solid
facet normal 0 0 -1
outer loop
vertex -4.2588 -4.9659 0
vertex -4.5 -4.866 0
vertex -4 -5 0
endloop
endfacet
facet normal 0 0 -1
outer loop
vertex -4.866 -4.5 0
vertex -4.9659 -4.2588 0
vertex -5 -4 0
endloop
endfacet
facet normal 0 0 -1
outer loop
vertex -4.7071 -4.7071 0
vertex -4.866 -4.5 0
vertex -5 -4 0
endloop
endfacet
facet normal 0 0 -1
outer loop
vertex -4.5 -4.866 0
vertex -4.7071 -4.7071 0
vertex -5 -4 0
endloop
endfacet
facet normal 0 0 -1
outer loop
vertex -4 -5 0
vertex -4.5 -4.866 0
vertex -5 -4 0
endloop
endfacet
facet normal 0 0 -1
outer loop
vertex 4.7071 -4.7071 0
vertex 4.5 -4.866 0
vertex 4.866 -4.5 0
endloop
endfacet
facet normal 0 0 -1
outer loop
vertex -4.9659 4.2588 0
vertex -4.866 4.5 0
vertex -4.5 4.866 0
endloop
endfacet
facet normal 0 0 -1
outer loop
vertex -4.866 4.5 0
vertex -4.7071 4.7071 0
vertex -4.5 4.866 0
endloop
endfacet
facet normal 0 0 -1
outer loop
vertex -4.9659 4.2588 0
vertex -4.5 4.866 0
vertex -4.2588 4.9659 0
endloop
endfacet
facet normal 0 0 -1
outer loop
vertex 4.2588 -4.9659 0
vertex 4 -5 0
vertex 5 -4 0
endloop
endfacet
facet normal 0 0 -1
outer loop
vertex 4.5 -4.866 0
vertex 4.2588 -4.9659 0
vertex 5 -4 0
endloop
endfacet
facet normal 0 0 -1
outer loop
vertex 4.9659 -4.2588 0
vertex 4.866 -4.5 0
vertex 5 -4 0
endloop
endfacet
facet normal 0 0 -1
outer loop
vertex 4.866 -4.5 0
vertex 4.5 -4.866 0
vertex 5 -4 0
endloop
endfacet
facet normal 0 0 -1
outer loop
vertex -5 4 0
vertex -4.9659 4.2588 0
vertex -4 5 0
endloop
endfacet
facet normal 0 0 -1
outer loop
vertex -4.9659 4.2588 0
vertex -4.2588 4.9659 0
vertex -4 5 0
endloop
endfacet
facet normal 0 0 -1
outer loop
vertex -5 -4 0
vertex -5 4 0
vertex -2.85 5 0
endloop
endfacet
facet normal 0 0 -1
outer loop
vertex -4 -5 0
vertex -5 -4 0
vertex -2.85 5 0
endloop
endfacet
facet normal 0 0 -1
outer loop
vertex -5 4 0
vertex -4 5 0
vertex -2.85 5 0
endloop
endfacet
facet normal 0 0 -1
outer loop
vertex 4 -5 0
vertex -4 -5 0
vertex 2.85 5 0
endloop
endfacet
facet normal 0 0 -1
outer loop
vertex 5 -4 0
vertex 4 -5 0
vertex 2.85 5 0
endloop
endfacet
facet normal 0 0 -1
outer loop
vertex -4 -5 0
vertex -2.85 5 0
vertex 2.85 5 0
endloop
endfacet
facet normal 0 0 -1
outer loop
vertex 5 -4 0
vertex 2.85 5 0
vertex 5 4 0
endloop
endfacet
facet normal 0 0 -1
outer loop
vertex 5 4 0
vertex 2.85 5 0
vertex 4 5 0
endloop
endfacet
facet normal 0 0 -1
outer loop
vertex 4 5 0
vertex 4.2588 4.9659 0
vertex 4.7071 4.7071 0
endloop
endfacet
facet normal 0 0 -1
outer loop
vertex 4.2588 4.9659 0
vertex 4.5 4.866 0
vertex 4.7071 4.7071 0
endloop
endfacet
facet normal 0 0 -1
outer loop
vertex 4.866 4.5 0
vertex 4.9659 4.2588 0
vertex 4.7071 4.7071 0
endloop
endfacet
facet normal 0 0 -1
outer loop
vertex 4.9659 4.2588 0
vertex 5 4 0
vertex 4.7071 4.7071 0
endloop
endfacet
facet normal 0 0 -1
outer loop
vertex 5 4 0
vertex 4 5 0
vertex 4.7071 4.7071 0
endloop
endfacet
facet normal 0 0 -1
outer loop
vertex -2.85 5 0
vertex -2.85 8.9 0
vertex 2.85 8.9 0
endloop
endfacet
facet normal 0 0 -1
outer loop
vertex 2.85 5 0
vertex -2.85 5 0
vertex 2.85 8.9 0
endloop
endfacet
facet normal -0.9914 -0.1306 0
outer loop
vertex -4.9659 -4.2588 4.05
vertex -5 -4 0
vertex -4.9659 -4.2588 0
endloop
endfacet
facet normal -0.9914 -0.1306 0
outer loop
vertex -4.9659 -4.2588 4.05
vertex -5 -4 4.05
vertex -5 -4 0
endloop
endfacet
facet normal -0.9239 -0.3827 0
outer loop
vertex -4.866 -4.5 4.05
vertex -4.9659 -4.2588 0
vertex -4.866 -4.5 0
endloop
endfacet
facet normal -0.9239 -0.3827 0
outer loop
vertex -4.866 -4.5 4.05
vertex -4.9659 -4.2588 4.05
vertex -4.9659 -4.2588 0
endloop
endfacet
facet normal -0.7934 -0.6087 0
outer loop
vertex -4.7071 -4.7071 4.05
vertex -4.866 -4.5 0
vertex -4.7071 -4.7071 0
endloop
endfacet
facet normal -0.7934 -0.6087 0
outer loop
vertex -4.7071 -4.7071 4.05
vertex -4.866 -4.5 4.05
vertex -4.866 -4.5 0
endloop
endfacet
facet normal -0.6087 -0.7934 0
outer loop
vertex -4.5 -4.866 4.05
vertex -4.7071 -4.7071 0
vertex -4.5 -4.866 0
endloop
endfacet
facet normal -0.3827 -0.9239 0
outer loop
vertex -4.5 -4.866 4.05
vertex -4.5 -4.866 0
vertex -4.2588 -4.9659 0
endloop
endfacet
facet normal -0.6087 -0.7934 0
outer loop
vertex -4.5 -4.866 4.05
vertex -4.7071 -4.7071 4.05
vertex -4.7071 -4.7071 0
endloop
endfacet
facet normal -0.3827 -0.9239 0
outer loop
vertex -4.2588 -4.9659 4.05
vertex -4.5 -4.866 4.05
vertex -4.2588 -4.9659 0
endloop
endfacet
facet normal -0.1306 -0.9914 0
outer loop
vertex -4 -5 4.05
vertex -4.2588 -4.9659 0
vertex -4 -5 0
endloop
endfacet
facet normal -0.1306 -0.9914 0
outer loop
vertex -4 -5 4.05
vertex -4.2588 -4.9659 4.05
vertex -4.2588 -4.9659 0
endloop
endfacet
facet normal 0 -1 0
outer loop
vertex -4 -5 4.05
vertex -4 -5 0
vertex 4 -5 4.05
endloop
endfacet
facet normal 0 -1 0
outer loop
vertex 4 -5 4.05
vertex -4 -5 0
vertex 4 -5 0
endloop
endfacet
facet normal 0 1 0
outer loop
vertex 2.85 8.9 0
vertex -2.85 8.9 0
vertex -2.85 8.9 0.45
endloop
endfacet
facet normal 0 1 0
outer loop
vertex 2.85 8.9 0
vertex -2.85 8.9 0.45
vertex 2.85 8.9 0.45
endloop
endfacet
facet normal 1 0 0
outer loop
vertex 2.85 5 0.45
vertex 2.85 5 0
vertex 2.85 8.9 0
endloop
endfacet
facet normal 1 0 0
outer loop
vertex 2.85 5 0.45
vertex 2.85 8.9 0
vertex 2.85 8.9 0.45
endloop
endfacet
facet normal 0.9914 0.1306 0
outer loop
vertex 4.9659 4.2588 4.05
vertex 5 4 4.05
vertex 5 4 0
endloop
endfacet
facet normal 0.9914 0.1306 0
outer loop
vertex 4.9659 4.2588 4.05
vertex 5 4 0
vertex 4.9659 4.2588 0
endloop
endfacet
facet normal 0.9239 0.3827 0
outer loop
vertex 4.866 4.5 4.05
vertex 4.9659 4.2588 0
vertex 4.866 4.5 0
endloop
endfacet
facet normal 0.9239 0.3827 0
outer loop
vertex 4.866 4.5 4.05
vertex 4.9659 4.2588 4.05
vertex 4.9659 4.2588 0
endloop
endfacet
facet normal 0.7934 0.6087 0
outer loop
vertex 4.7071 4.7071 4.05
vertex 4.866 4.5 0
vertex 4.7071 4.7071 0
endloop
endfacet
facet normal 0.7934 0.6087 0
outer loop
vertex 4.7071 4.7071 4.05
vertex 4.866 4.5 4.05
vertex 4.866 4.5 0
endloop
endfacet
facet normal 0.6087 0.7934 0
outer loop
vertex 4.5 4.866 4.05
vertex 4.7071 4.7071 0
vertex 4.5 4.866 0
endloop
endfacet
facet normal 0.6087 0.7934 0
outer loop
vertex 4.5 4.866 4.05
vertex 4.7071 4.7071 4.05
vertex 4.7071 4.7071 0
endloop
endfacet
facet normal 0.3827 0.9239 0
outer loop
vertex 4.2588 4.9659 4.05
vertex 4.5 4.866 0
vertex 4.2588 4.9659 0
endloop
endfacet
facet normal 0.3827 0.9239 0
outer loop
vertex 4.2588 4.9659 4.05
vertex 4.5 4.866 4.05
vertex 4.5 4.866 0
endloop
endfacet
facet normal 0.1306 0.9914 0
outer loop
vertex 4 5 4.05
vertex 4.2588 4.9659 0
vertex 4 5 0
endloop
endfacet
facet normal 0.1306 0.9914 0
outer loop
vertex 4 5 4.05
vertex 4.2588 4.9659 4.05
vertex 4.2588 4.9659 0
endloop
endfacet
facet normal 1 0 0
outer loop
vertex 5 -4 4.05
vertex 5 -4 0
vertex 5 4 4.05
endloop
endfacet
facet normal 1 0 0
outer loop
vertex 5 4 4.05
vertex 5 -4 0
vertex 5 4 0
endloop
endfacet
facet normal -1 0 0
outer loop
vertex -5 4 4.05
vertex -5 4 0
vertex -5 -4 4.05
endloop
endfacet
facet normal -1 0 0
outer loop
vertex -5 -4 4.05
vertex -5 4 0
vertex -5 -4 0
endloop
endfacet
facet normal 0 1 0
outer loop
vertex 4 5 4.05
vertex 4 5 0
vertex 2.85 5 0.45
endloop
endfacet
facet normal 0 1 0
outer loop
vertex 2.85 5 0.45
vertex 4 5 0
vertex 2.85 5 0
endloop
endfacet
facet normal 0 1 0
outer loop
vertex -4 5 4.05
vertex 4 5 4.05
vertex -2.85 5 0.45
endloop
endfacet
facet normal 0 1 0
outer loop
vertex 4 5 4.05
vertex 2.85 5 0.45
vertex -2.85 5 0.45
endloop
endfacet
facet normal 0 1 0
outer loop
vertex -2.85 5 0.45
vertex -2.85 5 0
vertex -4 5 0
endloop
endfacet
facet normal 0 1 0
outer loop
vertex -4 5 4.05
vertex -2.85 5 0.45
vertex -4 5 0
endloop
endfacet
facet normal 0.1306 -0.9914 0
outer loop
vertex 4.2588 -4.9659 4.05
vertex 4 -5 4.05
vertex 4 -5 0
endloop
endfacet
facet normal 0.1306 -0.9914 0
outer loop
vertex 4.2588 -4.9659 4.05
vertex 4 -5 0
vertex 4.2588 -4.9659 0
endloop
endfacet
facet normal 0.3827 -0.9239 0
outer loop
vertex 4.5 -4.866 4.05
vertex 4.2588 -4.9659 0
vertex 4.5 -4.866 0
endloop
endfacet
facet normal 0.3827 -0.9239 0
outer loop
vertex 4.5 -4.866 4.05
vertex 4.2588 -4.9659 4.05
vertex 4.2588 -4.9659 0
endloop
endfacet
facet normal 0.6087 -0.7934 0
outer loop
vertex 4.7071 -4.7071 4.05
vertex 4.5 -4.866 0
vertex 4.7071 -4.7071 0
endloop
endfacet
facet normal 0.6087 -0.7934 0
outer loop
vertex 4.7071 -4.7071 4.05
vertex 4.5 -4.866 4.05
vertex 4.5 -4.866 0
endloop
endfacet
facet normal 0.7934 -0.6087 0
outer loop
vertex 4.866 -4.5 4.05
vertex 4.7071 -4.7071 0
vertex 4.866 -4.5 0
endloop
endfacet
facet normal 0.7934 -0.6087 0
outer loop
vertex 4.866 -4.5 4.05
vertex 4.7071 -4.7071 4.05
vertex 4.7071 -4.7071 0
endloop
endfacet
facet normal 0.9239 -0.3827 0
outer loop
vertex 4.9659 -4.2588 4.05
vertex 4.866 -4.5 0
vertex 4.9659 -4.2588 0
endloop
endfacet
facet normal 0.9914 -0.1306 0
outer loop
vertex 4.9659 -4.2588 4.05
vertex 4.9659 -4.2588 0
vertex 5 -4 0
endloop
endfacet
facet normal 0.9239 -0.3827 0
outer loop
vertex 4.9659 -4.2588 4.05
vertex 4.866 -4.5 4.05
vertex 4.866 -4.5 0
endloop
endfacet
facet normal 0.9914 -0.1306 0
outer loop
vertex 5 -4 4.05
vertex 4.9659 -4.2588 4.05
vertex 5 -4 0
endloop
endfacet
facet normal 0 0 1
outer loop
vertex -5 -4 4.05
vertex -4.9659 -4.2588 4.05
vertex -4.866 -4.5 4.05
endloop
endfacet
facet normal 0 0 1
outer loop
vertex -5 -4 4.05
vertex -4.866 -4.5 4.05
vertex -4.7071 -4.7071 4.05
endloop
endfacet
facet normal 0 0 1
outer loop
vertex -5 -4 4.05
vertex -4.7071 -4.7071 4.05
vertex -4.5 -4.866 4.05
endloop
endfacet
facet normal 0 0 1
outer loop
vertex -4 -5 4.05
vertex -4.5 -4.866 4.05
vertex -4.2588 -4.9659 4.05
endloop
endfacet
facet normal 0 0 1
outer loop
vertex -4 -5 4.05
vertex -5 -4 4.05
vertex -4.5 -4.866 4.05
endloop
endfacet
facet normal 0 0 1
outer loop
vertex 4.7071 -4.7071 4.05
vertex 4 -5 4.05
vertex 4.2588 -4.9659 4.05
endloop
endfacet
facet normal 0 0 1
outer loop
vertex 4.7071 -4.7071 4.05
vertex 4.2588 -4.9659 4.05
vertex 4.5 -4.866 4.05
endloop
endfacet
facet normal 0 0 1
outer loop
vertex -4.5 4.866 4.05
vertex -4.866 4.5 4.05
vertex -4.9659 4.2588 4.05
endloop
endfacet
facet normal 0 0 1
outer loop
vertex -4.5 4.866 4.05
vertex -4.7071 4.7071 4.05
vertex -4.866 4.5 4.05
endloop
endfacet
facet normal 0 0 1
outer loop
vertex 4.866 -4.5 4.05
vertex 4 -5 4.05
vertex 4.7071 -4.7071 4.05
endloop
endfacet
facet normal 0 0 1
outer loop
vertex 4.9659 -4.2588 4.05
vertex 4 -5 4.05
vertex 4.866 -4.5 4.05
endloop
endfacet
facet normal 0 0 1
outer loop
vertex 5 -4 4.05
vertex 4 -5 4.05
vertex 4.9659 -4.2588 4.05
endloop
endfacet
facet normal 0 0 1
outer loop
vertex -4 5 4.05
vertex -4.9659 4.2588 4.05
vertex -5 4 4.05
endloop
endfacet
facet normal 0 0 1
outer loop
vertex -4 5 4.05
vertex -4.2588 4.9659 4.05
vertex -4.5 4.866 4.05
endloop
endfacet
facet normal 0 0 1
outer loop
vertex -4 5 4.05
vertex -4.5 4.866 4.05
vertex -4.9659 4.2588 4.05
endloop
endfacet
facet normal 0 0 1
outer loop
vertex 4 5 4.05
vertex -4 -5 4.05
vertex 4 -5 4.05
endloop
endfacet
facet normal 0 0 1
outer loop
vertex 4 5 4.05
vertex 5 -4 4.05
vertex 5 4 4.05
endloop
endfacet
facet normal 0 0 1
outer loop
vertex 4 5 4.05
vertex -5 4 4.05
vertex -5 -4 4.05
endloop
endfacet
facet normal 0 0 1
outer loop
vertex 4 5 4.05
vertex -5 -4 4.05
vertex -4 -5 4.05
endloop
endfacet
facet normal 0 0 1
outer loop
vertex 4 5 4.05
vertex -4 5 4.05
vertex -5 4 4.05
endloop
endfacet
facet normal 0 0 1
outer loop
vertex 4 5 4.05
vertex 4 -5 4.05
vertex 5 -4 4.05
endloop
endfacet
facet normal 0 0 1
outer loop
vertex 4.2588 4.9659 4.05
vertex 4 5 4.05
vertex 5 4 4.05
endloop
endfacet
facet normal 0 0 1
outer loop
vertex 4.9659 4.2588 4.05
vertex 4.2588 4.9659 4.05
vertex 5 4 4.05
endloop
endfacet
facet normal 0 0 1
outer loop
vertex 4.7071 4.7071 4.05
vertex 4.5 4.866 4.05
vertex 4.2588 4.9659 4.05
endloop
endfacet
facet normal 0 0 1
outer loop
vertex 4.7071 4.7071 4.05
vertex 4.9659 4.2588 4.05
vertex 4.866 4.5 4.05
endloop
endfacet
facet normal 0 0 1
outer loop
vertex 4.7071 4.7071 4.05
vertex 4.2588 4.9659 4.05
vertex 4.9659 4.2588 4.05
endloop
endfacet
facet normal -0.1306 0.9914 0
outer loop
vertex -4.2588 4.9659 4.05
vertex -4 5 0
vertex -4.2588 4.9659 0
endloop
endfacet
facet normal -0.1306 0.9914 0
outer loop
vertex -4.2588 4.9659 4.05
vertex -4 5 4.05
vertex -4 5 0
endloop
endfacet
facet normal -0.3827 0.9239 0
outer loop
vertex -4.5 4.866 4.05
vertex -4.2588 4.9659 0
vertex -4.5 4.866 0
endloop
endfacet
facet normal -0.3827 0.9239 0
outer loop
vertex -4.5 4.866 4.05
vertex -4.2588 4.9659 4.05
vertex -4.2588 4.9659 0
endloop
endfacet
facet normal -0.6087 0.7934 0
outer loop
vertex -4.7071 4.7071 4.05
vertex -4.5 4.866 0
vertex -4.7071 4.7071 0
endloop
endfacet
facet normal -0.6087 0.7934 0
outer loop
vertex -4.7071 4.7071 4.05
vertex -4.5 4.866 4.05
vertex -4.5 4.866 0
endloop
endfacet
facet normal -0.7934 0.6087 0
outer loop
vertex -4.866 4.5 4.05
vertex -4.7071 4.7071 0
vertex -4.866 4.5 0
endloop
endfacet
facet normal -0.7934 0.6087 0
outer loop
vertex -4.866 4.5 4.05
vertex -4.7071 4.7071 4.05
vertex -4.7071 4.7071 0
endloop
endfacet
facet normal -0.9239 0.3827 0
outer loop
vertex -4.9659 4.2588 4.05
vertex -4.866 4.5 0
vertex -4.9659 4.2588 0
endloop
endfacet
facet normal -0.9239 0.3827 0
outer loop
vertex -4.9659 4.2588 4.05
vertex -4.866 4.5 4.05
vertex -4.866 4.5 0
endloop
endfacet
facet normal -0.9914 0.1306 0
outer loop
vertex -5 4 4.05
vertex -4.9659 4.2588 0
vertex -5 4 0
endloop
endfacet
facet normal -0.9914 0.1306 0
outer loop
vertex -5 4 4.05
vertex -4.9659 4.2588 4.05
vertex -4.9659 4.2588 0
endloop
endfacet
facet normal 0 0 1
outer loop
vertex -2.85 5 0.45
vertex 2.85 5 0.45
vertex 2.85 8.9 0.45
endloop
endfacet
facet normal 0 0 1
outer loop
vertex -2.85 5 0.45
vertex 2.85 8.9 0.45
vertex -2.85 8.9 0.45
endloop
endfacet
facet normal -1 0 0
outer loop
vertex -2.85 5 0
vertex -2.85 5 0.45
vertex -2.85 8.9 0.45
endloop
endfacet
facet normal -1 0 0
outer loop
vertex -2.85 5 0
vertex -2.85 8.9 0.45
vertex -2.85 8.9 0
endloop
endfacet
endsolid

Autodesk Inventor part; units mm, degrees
ref_plane "YZ Plane" through (0, 0, 0) normal (1, 0, 0) x (0, 1, 0)
ref_plane "XZ Plane" through (0, 0, 0) normal (0, 1, 0) x (-1, 0, 0)
ref_plane "XY Plane" through (0, 0, 0) normal (0, 0, 1) x (1, 0, 0)
sketch "スケッチ1" plane through (0, 0, 0) normal (0, 0, 1) x (1, 0, 0)
  line L0 (-5, -5) -> (5, -5)
  line L1 (5, -5) -> (5, 5)
  line L2 (5, 5) -> (-5, 5)
  line L3 (-5, 5) -> (-5, -5)
  line L4 (-5, -5) -> (5, 5) construction
  line L5 (5, -5) -> (-5, 5) construction
  point P0 (0, 0)
  dimension "d0" = 10
  dimension "d1" = 10
extrude "押し出し1" add sketch "スケッチ1" along normal blind 4.05
sketch "スケッチ2" plane through (-5, 5, 0) normal (0, 1, 0) x (1, 0, 0)
  line L0 (5, 0) -> (2.15, 0)
  line L1 (10, 0) -> (0, 0) projected
  line L2 (2.15, 0) -> (7.85, 0)
  line L3 (7.85, 0) -> (7.85, -0.45)
  line L4 (7.85, -0.45) -> (2.15, -0.45)
  line L5 (2.15, -0.45) -> (2.15, 0)
  dimension "d4" = 2.85
  dimension "d5" = 5.7
  dimension "d6" = 0.45
extrude "押し出し2" add sketch "スケッチ2" along normal blind 3.9
fillet "フィレット1" radius 1 4 edges at (5, 5, 2.025) (5, -5, 2.025) (-5, 5, 2.025) (-5, -5, 2.025)
properties part number "VLV101040A"
